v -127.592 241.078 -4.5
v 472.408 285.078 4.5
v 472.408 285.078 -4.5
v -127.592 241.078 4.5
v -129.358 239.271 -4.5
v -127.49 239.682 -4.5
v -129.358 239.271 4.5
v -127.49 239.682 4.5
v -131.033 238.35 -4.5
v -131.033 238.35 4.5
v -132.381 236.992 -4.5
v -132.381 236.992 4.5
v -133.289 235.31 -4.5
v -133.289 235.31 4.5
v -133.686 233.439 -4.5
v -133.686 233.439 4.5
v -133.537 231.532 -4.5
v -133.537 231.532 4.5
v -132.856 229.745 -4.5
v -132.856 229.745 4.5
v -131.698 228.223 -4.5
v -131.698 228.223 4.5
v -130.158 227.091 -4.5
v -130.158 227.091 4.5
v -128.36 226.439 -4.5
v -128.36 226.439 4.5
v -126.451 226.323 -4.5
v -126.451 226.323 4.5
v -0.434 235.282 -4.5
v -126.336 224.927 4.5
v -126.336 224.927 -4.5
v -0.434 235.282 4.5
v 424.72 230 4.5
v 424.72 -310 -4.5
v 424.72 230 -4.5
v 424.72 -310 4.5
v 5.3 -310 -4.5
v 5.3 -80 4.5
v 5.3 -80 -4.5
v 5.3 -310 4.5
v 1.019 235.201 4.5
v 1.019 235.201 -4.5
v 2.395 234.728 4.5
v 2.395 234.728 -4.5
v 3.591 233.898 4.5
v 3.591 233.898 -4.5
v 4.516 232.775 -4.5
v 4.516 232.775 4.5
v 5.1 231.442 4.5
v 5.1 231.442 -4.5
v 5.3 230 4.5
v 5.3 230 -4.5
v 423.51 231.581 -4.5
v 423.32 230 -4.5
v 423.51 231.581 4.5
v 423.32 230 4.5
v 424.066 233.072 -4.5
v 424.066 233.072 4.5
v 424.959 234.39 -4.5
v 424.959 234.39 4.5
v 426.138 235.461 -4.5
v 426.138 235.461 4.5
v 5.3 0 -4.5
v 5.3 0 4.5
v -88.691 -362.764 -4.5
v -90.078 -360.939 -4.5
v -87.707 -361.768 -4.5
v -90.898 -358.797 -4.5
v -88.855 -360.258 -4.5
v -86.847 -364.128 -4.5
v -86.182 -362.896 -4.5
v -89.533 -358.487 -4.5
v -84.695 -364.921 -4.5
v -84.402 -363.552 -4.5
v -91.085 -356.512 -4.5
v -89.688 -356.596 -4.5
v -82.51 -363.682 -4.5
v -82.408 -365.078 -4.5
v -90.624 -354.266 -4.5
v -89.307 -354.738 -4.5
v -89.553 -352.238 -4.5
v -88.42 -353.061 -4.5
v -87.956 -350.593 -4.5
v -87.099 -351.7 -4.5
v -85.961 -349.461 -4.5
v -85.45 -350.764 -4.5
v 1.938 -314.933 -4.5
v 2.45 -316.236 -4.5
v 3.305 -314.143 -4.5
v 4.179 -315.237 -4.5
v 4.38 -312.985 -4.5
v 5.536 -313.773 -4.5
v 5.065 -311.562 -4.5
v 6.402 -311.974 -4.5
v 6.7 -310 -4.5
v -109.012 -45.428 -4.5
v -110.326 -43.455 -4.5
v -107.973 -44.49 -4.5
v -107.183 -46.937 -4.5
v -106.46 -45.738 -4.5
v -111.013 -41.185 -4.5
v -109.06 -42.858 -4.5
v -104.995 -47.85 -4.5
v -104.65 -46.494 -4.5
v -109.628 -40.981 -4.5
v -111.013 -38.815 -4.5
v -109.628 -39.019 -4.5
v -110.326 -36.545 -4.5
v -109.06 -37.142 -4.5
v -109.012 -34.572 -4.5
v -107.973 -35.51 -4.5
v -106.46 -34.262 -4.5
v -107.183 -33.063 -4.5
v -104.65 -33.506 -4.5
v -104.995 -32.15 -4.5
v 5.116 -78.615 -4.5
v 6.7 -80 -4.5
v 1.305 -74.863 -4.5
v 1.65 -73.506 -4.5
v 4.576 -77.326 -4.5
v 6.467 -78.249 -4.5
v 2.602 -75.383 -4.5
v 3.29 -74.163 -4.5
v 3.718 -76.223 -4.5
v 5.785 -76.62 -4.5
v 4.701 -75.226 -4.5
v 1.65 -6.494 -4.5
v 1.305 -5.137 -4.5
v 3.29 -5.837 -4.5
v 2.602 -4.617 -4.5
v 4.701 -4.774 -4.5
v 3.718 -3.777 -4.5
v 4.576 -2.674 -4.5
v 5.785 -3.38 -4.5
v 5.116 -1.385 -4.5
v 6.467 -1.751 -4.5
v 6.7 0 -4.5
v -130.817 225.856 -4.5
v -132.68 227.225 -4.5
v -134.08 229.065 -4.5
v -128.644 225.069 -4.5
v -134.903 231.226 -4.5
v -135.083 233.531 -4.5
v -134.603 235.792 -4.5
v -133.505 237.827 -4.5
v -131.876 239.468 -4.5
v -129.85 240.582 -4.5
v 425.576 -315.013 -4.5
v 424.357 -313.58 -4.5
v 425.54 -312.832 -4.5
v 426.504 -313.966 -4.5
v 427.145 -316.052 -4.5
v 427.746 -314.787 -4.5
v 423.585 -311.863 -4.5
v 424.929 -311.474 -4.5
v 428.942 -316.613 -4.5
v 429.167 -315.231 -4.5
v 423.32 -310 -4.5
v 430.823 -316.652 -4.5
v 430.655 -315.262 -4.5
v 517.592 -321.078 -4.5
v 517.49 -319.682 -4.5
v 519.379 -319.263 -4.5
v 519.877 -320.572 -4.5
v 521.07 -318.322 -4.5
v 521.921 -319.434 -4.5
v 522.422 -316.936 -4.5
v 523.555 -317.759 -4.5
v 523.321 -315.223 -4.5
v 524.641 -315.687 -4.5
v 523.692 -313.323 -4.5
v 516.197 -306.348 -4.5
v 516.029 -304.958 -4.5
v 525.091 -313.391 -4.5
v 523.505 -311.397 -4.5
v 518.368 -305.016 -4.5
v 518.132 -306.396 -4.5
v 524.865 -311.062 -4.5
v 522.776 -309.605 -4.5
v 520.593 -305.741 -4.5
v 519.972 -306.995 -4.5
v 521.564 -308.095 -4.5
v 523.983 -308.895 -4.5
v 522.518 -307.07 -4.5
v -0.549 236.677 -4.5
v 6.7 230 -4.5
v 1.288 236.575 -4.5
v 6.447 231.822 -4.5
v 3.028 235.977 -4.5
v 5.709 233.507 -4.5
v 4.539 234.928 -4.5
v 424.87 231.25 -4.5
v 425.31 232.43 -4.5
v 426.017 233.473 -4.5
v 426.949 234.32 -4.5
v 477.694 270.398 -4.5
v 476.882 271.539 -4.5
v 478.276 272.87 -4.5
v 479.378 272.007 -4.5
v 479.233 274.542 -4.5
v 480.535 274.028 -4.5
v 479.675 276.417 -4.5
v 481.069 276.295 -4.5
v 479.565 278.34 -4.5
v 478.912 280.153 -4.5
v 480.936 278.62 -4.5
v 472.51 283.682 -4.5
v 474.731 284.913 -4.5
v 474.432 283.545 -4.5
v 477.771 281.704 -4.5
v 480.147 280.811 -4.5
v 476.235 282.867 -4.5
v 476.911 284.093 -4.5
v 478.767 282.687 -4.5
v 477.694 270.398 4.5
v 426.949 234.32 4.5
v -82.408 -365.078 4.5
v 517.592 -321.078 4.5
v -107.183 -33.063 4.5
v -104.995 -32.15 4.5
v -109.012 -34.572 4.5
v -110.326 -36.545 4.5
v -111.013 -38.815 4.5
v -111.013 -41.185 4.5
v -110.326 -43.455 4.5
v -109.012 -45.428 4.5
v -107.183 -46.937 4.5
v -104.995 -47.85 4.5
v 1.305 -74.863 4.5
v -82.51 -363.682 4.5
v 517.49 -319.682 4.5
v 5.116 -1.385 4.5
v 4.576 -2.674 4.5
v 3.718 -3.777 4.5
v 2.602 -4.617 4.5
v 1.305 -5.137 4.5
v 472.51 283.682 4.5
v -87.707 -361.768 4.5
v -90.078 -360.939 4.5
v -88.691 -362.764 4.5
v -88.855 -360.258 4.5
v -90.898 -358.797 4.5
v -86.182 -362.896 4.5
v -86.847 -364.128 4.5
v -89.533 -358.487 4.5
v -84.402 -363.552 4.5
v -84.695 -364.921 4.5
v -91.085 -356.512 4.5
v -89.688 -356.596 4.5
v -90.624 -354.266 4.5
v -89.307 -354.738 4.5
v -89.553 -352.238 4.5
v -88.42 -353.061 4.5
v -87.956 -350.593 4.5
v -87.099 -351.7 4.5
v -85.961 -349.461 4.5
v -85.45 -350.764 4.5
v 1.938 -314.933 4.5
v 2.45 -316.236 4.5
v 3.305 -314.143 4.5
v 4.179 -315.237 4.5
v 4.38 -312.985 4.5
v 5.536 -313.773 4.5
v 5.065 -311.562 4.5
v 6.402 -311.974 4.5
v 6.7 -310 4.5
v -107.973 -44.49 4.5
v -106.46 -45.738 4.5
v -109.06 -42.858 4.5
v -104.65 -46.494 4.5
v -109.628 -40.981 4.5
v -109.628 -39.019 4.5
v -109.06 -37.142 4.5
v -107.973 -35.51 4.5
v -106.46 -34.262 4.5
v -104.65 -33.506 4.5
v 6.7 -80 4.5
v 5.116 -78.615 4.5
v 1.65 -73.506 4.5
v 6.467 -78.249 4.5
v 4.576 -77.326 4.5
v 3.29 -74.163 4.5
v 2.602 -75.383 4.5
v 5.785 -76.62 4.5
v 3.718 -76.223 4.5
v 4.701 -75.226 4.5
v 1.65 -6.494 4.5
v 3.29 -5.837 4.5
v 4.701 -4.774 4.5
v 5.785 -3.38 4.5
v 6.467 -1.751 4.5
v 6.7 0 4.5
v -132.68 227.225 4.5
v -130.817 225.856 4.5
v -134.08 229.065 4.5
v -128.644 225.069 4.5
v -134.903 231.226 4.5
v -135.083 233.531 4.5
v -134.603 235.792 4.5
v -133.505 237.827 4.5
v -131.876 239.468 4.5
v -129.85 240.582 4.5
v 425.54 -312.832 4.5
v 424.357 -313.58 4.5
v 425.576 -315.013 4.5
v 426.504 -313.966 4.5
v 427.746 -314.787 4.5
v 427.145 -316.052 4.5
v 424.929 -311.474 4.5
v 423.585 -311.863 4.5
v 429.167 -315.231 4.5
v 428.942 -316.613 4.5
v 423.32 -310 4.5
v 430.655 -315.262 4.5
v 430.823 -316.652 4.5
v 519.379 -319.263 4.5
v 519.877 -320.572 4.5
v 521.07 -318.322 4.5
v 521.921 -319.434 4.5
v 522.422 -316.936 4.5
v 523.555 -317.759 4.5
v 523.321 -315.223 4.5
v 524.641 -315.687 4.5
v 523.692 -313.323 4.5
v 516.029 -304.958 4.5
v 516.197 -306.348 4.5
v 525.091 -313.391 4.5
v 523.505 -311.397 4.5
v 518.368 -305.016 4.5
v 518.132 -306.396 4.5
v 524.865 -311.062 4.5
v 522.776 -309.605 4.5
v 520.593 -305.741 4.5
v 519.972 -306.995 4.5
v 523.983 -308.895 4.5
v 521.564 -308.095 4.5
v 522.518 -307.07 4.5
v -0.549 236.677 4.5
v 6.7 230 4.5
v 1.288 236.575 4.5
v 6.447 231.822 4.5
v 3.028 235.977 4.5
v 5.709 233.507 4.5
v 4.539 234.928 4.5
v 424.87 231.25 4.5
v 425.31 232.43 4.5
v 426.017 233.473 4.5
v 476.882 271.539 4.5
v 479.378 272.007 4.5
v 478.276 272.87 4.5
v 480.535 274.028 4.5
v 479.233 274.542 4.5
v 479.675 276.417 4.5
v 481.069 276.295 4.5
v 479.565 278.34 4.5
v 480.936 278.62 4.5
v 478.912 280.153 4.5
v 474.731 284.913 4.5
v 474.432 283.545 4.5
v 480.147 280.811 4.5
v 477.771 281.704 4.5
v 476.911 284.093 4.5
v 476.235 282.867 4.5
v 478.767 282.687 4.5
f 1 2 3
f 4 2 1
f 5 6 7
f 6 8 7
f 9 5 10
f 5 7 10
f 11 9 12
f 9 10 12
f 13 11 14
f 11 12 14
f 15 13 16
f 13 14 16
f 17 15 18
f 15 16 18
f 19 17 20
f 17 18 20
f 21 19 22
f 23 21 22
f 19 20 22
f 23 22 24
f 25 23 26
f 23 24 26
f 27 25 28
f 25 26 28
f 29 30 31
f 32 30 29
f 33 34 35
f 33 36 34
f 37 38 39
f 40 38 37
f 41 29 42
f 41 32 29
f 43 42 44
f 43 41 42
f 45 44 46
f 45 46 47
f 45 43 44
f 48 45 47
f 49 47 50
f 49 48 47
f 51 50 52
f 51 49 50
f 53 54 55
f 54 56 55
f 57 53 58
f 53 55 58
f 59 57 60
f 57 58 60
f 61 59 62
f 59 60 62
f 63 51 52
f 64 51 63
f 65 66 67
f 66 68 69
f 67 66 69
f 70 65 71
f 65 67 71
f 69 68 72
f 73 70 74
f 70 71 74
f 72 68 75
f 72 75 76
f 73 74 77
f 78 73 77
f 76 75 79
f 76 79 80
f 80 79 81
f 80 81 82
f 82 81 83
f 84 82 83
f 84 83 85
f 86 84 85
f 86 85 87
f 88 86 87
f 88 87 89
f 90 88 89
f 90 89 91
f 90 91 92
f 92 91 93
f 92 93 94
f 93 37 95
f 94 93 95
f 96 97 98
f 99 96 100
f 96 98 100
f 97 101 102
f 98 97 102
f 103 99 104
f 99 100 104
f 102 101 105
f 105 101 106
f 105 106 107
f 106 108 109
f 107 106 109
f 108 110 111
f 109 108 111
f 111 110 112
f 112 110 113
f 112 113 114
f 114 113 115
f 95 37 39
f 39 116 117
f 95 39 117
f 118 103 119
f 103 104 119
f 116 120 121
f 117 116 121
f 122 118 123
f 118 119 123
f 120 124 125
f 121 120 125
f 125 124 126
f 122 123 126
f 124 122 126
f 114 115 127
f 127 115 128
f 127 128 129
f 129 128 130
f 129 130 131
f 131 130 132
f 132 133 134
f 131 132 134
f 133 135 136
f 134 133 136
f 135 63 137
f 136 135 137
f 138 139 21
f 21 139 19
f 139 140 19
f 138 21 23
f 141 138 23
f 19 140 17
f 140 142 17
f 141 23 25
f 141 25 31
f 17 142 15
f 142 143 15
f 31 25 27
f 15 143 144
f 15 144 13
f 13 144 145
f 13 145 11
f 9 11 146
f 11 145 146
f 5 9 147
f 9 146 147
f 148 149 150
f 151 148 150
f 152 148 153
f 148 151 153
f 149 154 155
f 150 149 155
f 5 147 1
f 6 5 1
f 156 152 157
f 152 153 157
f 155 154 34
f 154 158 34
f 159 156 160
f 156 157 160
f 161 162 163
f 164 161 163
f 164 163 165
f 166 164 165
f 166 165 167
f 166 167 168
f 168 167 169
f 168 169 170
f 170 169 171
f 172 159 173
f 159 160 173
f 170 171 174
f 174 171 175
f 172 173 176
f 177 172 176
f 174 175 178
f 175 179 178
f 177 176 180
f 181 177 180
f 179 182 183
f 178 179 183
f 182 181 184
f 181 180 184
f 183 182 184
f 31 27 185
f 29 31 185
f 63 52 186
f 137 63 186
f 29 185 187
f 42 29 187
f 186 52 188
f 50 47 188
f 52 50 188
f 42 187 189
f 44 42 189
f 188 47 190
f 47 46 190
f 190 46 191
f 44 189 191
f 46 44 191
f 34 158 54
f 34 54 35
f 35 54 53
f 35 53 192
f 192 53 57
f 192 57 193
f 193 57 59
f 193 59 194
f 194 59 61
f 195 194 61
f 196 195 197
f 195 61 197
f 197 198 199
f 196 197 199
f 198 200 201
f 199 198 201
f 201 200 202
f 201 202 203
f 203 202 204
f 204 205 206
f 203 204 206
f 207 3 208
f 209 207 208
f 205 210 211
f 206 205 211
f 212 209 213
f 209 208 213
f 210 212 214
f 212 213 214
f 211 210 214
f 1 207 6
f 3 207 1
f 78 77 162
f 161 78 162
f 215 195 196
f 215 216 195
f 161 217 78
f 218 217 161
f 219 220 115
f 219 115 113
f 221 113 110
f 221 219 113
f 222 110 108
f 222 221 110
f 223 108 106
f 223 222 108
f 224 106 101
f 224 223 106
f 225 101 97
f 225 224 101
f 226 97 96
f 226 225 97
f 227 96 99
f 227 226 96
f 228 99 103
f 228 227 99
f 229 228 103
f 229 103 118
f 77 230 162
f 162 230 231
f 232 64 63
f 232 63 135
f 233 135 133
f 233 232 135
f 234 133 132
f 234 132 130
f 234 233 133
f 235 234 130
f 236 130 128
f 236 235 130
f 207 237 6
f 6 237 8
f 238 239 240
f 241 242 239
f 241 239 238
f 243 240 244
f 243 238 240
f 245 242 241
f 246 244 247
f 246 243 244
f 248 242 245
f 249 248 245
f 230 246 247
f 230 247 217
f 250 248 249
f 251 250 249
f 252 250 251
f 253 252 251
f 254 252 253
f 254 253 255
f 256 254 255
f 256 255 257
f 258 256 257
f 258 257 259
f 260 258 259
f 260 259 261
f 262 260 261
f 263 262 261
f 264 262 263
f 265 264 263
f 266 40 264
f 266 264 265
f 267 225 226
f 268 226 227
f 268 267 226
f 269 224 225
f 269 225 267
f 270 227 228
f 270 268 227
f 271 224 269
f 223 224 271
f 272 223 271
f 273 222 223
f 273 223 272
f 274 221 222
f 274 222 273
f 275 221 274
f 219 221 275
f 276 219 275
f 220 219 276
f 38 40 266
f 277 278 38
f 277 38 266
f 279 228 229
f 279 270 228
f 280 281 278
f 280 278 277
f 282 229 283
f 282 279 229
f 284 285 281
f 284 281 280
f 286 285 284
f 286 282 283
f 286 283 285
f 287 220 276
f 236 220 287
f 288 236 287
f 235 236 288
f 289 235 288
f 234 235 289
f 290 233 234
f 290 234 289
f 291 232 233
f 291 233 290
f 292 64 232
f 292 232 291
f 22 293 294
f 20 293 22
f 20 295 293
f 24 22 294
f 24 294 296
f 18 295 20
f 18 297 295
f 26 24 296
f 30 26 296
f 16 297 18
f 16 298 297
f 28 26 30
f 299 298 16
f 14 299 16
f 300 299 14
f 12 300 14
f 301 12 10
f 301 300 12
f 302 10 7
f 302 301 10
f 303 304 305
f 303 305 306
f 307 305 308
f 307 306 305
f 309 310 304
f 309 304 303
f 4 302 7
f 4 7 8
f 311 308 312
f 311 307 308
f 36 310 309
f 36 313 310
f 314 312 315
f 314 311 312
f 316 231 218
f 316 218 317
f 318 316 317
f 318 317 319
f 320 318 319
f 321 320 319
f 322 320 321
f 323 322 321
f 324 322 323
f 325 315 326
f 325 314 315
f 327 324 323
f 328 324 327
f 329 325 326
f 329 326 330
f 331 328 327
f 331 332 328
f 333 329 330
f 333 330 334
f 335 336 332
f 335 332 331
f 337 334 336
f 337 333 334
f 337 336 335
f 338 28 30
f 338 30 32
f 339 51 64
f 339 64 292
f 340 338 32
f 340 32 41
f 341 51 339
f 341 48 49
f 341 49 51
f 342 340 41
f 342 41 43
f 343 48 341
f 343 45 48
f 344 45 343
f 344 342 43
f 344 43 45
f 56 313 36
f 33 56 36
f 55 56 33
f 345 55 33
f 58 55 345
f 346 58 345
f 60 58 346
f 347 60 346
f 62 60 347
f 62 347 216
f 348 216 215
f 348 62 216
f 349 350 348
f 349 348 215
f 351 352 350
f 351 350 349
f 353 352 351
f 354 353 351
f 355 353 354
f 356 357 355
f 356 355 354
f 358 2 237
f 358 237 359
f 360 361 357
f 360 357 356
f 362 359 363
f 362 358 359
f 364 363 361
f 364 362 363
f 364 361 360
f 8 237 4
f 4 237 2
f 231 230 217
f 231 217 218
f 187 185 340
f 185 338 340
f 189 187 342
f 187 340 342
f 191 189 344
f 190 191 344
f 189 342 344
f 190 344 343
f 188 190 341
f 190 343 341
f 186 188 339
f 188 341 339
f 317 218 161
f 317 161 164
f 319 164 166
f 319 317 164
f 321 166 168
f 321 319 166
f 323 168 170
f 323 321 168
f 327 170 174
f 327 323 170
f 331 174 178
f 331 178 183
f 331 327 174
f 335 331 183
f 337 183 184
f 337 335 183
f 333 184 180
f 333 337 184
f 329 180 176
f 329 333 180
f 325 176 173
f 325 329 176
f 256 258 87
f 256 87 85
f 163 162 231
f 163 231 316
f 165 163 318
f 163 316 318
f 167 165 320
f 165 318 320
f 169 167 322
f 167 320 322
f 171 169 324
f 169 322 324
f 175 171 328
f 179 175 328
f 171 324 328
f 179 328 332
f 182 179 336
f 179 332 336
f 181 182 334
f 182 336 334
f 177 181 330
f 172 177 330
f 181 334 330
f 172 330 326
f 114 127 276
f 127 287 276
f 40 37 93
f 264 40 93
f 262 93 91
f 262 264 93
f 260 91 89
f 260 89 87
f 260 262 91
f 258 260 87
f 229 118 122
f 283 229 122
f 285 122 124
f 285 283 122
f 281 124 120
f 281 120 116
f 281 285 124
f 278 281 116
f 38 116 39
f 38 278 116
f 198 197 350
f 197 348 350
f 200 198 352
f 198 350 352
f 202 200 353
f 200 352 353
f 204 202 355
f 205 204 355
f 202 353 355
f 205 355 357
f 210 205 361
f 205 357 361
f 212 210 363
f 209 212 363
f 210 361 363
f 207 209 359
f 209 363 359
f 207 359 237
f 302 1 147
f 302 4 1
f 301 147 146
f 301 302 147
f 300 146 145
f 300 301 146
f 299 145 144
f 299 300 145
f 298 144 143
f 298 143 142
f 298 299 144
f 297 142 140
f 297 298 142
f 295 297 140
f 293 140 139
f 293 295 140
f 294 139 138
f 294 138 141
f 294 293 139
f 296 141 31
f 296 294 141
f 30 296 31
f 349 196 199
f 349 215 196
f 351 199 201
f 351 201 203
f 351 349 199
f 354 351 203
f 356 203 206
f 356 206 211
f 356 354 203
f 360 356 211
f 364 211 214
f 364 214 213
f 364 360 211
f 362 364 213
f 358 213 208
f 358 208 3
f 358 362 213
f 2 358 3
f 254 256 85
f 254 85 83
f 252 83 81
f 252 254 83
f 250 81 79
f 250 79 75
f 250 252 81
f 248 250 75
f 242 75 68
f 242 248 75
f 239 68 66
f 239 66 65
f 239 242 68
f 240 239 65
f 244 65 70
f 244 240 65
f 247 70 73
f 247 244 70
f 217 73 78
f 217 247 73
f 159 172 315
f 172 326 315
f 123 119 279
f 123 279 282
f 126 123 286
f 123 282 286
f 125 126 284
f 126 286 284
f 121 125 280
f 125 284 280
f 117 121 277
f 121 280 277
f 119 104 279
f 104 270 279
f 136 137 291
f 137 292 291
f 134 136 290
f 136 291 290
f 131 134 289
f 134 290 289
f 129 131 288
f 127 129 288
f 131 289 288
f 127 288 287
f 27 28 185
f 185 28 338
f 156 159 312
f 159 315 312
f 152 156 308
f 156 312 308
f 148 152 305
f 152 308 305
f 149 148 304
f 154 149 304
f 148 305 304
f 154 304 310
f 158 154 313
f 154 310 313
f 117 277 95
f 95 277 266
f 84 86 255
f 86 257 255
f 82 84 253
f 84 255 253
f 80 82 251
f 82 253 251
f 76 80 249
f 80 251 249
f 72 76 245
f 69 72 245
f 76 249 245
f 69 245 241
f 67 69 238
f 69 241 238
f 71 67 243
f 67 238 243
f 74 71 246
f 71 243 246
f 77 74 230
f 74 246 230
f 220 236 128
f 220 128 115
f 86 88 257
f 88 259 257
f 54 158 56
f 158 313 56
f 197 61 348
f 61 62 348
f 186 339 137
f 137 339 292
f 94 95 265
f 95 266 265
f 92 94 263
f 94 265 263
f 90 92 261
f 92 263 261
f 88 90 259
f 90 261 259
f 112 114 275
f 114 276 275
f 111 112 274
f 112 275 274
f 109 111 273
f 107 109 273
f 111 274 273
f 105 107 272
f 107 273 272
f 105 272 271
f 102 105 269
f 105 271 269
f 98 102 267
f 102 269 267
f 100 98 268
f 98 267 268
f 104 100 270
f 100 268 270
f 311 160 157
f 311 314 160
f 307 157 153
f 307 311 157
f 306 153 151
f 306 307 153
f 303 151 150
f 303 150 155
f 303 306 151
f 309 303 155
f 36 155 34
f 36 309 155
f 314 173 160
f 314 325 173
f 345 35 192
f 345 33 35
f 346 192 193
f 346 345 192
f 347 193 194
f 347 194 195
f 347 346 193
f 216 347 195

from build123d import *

# Parameters (mm, degrees)
EXTRUDE_1_DEPTH = 4.5


with BuildPart() as part:
    # Эскиз2 → Вытянуть-Тонкостенный1 (new, symmetric)
    with BuildSketch(Plane.XY):
        with BuildLine():
            Line((5.3, 230), (5.3, 0))
            ThreePointArc((5.3, 0), (4.183794955, -3.253591827), (1.305335933, -5.136740027))
            Line((1.305335933, -5.136740027), (-104.994947369, -32.149510525))
            ThreePointArc((-104.994947369, -32.149510525), (-111.1, -40), (-104.994947369, -47.850489475))
            Line((-104.994947369, -47.850489475), (1.305335933, -74.863259973))
            ThreePointArc((1.305335933, -74.863259973), (4.183794955, -76.746408173), (5.3, -80))
            Line((5.3, -80), (5.3, -310))
            ThreePointArc((5.3, -310), (4.379504294, -312.98495262), (1.937757682, -314.933061439))
            Line((1.937757682, -314.933061439), (-85.961478722, -349.460792895))
            ThreePointArc((-85.961478722, -349.460792895), (-90.898089189, -358.797272144), (-82.407590787, -365.078307454))
            Line((-82.407590787, -365.078307454), (517.592409213, -321.078307454))
            ThreePointArc((517.592409213, -321.078307454), (525.062194527, -312.218322694), (516.029484483, -304.958352182))
            Line((516.029484483, -304.958352182), (430.655423427, -315.261818943))
            ThreePointArc((430.655423427, -315.261818943), (426.504406414, -313.965832319), (424.720394755, -310))
            Line((424.720394755, -310), (424.720394755, 230))
            ThreePointArc((424.720394755, 230), (425.310455419, 232.430323322), (426.949251906, 234.319500156))
            Line((426.949251906, 234.319500156), (477.693633412, 270.398499762))
            ThreePointArc((477.693633412, 270.398499762), (480.620970965, 279.744230593), (472.407590787, 285.078307454))
            Line((472.407590787, 285.078307454), (-127.592409213, 241.078307454))
            ThreePointArc((-127.592409213, 241.078307454), (-135.075604128, 232.371813747), (-126.336049032, 224.927257646))
            Line((-126.336049032, 224.927257646), (-0.434437053, 235.28216475))
            ThreePointArc((-0.434437053, 235.28216475), (3.590785681, 233.898237831), (5.3, 230))
        make_face()
        with BuildLine():
            Line((6.7, 230), (6.7, 0))
            ThreePointArc((6.7, 0), (5.288948339, -4.113031178), (1.650141651, -6.493614751))
            Line((1.650141651, -6.493614751), (-104.650141651, -33.506385249))
            ThreePointArc((-104.650141651, -33.506385249), (-109.7, -40), (-104.650141651, -46.493614751))
            Line((-104.650141651, -46.493614751), (1.650141651, -73.506385249))
            ThreePointArc((1.650141651, -73.506385249), (5.288948339, -75.886968822), (6.7, -80))
            Line((6.7, -80), (6.7, -310))
            ThreePointArc((6.7, -310), (5.536354485, -313.77343067), (2.449618202, -316.236134272))
            Line((2.449618202, -316.236134272), (-85.449618202, -350.763865728))
            ThreePointArc((-85.449618202, -350.763865728), (-89.532987354, -358.486632515), (-82.509982503, -363.682056783))
            Line((-82.509982503, -363.682056783), (517.490017497, -319.682056783))
            ThreePointArc((517.490017497, -319.682056783), (523.668728806, -312.353427414), (516.197227906, -306.34826662))
            Line((516.197227906, -306.34826662), (430.82316685, -316.65173338))
            ThreePointArc((430.82316685, -316.65173338), (425.575654776, -315.013410667), (423.320394755, -310))
            Line((423.320394755, -310), (423.320394755, 230))
            ThreePointArc((423.320394755, 230), (424.0663205, 233.07229552), (426.138006625, 235.460500197))
            Line((426.138006625, 235.460500197), (476.882388131, 271.539499803))
            ThreePointArc((476.882388131, 271.539499803), (479.303766107, 279.269919132), (472.509982503, 283.682056783))
            Line((472.509982503, 283.682056783), (-127.490017497, 239.682056783))
            ThreePointArc((-127.490017497, 239.682056783), (-133.679820698, 232.480389148), (-126.450805989, 226.322546448))
            Line((-126.450805989, 226.322546448), (-0.549194011, 236.677453552))
            ThreePointArc((-0.549194011, 236.677453552), (4.539295107, 234.927961032), (6.7, 230))
        make_face(mode=Mode.SUBTRACT)
    extrude(amount=EXTRUDE_1_DEPTH, both=True)


solid = part.part
